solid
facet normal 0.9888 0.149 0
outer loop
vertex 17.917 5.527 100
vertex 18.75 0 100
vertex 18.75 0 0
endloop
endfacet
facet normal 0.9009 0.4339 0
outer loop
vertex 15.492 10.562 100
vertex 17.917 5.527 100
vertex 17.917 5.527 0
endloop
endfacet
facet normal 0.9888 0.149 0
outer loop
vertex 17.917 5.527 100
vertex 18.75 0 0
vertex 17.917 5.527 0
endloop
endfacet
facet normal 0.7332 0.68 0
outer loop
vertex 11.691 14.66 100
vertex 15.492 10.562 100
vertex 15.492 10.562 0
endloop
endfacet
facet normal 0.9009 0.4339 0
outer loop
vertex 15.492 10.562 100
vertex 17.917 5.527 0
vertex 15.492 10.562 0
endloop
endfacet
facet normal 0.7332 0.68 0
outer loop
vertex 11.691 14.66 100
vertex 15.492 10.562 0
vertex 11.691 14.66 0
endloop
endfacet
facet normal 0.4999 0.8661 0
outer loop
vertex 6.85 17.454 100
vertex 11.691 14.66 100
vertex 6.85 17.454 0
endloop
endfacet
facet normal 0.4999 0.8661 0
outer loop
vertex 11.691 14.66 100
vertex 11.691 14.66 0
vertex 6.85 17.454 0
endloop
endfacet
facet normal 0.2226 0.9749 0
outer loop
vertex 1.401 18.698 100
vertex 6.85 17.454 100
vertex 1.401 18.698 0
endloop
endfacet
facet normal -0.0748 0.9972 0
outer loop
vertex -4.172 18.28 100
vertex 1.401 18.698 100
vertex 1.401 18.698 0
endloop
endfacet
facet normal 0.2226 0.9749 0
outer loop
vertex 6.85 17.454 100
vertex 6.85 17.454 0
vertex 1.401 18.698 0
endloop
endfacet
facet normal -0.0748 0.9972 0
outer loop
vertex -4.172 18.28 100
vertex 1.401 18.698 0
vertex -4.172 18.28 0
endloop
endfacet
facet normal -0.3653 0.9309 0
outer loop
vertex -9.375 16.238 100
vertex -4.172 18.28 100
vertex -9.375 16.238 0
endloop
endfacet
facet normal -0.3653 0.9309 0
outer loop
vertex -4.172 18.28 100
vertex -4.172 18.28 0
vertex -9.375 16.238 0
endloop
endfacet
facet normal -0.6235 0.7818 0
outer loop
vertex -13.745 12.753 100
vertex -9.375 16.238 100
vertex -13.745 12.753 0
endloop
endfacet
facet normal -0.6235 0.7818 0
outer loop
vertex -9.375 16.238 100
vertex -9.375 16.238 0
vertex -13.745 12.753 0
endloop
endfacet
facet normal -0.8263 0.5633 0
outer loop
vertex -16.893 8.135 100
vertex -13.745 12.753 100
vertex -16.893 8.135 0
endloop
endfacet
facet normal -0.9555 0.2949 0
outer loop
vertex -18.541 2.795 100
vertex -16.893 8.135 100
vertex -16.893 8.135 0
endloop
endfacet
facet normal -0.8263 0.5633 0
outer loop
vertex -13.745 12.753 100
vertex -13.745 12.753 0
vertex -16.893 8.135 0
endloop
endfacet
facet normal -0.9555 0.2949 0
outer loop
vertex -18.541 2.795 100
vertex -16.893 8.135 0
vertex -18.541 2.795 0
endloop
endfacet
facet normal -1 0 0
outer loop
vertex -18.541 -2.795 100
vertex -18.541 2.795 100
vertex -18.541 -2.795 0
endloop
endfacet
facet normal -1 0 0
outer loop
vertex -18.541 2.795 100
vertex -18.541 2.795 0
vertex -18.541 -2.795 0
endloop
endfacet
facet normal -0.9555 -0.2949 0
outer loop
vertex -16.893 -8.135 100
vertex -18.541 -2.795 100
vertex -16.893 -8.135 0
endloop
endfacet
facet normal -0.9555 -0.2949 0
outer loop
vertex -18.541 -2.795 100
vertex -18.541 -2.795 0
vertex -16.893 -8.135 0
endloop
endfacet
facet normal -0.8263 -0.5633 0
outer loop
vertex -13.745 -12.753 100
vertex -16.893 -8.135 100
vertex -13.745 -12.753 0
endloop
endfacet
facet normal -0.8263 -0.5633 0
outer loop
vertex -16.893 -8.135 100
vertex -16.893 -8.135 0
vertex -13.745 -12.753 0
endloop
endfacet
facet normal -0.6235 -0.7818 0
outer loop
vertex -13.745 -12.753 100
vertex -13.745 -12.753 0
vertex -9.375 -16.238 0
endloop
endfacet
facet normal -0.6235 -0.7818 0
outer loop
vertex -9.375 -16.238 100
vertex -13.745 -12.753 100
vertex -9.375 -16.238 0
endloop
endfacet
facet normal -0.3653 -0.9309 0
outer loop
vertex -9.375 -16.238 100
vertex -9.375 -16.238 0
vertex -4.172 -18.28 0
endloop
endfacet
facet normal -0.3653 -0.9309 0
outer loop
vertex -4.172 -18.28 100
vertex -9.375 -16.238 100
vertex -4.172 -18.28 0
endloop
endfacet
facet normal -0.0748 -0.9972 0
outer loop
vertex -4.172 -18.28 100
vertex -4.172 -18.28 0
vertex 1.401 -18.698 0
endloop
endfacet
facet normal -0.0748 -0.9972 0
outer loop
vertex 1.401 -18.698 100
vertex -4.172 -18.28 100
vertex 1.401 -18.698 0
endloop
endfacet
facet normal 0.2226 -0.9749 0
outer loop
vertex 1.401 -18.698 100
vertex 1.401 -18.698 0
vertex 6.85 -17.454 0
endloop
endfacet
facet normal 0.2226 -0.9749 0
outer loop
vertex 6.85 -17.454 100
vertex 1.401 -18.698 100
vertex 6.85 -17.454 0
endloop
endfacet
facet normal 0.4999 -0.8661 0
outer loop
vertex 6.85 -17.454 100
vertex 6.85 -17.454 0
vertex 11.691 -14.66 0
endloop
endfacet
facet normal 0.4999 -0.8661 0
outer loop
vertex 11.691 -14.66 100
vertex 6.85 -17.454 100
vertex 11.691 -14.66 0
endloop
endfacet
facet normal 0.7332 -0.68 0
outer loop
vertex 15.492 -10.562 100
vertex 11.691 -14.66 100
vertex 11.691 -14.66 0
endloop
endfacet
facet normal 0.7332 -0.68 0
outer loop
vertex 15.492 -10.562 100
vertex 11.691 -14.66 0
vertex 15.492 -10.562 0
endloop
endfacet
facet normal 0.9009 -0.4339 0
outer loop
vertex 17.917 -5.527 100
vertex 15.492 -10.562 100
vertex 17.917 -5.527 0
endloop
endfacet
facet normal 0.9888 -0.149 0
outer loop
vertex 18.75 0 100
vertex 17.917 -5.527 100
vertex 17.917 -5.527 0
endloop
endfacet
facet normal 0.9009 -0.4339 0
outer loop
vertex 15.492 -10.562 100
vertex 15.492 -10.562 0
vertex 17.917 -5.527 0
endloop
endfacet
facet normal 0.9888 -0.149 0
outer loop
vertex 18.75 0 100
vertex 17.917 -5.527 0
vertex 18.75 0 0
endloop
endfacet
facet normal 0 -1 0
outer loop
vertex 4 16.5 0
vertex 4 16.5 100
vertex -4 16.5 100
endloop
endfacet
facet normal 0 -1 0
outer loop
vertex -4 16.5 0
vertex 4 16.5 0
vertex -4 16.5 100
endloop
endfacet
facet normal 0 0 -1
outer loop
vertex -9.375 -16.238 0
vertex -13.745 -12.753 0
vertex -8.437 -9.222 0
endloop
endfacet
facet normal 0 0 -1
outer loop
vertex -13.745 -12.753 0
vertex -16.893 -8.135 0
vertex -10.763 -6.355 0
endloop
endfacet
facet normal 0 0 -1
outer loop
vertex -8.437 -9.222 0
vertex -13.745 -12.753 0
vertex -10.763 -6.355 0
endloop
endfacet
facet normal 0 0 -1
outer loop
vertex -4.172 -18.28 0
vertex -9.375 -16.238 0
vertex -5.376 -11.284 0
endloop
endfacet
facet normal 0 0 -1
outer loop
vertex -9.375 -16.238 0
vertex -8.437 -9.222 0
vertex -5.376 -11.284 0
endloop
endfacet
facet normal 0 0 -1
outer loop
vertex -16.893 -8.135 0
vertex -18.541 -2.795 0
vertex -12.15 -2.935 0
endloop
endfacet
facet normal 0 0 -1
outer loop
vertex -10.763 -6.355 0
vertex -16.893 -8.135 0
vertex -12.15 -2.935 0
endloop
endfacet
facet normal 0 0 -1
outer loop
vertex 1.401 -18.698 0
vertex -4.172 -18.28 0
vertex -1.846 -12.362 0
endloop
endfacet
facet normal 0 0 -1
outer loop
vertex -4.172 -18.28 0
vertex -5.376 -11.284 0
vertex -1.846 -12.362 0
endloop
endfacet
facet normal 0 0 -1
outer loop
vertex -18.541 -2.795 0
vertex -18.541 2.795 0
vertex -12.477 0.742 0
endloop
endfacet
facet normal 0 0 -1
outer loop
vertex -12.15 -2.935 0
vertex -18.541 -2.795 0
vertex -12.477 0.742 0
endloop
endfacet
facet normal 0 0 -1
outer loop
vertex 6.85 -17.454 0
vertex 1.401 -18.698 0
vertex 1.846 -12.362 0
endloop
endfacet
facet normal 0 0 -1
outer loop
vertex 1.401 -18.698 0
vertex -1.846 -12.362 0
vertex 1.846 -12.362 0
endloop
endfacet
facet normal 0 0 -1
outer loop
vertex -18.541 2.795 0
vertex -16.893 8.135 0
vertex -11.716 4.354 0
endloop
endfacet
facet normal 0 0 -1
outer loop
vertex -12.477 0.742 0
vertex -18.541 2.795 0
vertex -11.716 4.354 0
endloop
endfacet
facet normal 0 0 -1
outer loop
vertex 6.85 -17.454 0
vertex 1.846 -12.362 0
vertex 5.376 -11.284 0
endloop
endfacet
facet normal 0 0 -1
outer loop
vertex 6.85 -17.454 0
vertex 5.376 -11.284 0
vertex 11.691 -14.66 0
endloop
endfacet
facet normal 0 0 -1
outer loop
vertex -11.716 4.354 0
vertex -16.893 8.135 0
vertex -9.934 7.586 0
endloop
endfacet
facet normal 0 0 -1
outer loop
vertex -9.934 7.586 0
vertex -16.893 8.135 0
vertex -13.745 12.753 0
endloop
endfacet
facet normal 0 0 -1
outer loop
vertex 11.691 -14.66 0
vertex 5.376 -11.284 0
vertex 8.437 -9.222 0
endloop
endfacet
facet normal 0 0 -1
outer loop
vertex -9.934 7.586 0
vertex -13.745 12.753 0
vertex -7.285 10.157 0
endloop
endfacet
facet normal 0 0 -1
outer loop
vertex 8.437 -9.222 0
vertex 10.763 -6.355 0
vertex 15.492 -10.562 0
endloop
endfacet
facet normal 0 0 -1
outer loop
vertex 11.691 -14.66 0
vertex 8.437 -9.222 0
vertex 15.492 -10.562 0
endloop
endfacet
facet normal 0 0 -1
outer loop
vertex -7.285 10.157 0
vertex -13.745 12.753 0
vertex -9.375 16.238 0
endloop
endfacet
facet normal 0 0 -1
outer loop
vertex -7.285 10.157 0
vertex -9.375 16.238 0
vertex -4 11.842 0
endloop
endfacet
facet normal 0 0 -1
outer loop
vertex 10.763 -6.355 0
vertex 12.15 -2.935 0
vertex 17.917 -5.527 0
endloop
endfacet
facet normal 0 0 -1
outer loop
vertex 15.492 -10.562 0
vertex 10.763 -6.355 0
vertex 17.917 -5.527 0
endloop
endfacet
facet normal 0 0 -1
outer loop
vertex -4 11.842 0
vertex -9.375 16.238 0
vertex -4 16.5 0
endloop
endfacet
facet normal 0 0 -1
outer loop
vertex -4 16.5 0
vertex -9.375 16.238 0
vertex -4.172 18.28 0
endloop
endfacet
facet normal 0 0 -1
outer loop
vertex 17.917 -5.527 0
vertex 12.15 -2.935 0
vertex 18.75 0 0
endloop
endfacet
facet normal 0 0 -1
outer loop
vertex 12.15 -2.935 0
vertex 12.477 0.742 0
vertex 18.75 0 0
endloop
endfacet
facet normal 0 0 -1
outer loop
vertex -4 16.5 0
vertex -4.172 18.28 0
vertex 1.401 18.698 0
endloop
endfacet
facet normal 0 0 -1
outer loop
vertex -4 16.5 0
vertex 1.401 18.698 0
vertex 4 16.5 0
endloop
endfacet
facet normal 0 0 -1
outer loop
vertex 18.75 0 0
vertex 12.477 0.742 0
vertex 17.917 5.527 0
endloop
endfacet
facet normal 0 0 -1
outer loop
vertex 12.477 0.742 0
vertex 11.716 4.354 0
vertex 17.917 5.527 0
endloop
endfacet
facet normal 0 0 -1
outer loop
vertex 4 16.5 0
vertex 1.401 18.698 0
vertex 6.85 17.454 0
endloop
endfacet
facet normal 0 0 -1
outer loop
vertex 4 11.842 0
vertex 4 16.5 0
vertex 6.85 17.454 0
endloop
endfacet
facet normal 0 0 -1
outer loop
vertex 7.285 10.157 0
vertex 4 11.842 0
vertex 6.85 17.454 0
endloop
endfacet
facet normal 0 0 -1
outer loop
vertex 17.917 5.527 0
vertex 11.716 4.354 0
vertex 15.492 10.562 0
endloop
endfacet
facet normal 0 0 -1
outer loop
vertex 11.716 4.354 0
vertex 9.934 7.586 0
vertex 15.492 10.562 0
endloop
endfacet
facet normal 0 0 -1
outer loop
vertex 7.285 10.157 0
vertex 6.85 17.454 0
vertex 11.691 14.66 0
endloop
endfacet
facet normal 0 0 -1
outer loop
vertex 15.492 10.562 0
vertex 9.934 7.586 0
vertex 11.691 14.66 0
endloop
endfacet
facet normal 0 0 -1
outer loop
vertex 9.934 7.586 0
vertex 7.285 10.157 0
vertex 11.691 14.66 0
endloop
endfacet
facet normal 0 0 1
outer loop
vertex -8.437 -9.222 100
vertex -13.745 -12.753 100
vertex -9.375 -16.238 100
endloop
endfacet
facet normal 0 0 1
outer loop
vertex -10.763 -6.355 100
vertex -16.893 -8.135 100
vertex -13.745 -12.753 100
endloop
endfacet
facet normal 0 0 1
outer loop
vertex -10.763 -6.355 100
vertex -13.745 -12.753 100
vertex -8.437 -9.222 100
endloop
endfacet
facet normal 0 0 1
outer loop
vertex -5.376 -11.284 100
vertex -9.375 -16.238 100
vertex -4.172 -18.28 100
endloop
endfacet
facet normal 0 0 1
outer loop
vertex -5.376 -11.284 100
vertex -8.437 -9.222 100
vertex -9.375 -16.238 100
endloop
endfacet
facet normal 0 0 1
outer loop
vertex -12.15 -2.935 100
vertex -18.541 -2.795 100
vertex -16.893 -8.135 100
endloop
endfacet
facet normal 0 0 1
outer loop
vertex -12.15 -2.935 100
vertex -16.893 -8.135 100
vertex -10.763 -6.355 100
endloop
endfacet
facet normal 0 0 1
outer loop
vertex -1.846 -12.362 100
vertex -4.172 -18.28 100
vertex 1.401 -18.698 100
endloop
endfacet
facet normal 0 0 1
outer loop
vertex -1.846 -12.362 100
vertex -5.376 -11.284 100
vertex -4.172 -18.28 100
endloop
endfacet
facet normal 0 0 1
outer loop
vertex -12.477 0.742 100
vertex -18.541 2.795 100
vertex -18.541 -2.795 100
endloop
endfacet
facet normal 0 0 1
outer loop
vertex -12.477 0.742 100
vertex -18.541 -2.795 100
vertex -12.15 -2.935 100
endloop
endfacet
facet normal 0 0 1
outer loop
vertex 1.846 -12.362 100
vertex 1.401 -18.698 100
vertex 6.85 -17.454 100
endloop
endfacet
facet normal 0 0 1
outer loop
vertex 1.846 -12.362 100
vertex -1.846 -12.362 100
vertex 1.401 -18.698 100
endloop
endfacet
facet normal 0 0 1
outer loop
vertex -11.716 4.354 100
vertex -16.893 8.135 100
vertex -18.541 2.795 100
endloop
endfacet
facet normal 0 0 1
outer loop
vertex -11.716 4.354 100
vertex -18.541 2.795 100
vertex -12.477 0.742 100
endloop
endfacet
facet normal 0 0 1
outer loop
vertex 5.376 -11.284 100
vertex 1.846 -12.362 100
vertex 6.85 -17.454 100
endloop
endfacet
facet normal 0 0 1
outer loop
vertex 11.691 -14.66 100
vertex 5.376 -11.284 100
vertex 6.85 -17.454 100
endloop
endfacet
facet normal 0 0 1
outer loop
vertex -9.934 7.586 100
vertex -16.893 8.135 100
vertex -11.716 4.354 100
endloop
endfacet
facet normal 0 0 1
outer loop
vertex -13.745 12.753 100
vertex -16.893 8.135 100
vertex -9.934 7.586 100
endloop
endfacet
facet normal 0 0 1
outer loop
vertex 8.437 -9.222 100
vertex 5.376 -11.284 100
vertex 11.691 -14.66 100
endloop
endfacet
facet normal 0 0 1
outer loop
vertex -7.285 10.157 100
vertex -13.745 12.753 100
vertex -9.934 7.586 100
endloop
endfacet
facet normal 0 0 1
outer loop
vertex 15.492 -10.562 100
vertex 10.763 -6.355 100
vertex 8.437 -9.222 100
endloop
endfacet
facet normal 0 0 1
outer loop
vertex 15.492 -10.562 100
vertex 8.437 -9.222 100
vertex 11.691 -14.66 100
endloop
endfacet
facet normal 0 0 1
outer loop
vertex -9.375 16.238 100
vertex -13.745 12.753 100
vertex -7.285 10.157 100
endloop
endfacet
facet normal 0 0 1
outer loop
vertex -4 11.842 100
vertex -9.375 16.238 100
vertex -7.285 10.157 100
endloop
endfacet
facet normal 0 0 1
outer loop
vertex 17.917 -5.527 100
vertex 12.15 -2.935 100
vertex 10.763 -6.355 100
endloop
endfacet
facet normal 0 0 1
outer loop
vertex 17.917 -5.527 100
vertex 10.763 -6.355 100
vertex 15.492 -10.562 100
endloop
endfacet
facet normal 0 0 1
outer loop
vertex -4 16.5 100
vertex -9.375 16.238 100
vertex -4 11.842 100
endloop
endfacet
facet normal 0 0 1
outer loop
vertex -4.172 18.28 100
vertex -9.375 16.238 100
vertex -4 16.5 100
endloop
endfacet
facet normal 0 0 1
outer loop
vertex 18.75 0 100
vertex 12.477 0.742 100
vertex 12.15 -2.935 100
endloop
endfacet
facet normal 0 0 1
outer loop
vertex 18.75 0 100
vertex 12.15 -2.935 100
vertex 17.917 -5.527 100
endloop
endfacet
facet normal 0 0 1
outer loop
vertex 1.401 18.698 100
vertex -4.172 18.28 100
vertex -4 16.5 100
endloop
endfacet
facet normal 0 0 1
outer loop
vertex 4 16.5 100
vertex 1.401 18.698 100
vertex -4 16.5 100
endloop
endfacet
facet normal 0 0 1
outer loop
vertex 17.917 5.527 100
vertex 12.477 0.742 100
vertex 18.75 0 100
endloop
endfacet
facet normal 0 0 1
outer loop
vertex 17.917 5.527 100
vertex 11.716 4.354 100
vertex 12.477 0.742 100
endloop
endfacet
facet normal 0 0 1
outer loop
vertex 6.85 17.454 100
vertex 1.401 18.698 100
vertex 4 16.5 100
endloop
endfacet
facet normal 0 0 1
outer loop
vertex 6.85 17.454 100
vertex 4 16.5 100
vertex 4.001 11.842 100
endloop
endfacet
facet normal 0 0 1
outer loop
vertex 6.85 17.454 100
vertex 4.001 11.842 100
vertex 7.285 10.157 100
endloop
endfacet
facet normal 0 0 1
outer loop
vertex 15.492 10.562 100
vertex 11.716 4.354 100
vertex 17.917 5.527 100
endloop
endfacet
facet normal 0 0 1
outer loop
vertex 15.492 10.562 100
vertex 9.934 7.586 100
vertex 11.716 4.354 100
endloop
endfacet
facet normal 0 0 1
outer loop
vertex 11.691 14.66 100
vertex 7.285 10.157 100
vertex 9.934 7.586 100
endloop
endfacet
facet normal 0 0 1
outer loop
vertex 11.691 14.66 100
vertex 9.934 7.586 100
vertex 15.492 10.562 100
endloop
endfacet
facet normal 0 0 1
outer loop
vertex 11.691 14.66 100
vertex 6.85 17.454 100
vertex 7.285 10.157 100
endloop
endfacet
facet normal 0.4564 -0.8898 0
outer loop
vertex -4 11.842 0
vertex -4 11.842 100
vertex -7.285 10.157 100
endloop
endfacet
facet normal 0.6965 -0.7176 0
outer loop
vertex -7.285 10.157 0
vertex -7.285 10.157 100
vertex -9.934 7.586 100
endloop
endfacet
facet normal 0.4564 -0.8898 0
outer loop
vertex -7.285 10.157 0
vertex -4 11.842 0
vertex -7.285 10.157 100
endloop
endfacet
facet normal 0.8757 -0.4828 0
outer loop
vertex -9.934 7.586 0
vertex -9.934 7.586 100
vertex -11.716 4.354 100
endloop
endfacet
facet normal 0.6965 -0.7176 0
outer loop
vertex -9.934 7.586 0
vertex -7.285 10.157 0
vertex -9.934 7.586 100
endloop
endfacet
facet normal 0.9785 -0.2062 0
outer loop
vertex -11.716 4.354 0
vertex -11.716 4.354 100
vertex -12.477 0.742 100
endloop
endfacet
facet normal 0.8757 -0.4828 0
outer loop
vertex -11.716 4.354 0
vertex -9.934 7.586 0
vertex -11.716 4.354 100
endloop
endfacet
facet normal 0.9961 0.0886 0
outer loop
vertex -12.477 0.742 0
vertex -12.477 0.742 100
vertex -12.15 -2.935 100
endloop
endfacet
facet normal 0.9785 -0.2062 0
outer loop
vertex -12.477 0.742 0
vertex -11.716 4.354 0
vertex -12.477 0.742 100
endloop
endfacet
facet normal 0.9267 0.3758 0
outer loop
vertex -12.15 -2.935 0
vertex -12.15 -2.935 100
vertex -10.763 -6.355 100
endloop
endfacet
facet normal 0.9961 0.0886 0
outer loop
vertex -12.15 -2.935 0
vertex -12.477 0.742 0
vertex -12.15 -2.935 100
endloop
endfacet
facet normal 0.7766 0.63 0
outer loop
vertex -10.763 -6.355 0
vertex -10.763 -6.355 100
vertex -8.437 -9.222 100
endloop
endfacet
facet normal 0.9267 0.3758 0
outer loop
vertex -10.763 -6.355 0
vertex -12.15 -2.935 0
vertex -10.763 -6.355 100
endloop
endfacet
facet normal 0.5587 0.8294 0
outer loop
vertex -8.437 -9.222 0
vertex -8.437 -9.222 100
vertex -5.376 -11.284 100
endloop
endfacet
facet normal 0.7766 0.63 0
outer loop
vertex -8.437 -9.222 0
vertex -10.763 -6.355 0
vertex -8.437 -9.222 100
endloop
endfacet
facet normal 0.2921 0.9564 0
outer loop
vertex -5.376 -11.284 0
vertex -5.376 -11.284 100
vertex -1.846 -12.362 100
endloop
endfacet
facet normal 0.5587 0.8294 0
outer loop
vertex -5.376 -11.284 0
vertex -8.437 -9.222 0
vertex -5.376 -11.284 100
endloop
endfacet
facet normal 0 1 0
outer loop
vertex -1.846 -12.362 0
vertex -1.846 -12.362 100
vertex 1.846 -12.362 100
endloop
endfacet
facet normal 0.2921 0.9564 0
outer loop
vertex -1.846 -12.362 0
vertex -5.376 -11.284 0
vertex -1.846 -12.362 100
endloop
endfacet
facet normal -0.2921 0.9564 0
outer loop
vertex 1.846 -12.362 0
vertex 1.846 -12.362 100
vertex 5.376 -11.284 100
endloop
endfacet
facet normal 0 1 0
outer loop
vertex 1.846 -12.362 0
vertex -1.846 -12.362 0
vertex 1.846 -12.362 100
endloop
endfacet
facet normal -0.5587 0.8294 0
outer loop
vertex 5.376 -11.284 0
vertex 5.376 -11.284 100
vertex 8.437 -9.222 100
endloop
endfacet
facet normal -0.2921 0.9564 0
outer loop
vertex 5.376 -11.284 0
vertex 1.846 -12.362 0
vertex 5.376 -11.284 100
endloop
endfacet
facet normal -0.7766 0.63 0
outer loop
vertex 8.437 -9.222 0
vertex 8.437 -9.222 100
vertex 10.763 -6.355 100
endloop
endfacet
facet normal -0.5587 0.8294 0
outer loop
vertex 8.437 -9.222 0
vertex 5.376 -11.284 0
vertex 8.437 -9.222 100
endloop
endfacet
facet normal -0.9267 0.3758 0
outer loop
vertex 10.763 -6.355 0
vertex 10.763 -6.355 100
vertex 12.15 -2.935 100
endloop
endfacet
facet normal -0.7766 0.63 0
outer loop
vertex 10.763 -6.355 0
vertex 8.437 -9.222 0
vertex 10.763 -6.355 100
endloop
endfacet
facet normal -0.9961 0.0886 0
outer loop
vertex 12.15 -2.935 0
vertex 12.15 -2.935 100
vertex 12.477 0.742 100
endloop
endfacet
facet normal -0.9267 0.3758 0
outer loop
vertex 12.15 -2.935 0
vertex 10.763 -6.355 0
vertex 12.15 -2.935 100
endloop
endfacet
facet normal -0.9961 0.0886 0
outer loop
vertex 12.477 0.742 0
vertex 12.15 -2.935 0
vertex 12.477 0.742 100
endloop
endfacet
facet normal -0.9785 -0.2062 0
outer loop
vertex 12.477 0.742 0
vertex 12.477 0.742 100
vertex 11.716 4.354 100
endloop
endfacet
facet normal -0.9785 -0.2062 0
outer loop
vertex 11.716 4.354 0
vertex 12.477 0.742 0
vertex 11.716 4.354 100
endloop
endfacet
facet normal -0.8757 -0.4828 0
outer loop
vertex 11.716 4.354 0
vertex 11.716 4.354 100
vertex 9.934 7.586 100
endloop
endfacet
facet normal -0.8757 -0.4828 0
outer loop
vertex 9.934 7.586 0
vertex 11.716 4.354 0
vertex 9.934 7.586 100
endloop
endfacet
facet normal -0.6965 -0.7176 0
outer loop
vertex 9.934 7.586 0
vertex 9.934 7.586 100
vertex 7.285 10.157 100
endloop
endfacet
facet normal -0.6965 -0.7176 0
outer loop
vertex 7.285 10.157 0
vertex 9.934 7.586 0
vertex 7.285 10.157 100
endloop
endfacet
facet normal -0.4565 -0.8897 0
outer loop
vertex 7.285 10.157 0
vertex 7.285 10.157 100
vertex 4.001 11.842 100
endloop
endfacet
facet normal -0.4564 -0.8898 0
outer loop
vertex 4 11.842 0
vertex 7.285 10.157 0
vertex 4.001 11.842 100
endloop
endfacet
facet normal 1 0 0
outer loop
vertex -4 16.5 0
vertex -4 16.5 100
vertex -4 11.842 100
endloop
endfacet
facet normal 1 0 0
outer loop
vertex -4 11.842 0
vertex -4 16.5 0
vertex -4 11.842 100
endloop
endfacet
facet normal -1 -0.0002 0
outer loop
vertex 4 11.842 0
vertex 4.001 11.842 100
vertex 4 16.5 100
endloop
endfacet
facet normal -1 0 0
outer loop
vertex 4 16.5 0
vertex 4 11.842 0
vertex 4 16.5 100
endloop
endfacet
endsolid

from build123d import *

# Parameters (mm, degrees)
F0_R     = 18.75028
F0_R_2   = 12.49934
F1_DEPTH = 99.9998
F3_DEPTH = 100.0008


with BuildPart() as f1:
    # F0 (on Top) → F1 (new body)
    with BuildSketch(Plane.XY):
        Circle(F0_R)
        Circle(F0_R_2, mode=Mode.SUBTRACT)
    extrude(amount=F1_DEPTH)

    # F2 (on face) → F3 (cut, through all)
    with BuildSketch(Plane.XY.offset(99.9998)):
        with BuildLine():
            ThreePointArc((-4.0005, 11.841854), (-7.288, -10.154731), (12.49934, 0))
            ThreePointArc((12.49934, 0), (10.154731, 7.288), (4.0005, 11.841854))
            Line((4.0005, 11.841854), (4.0005, 8.49884))
            Line((4.0005, 8.49884), (-4.0005, 8.49884))
            Line((-4.0005, 8.49884), (-4.0005, 11.841854))
        make_face()
        with BuildLine():
            ThreePointArc((-4.0005, 11.841854), (0, 12.49934), (4.0005, 11.841854))
            Line((4.0005, 11.841854), (4.0005, 16.49984))
            Line((4.0005, 16.49984), (-4.0005, 16.49984))
            Line((-4.0005, 16.49984), (-4.0005, 11.841854))
        make_face()
    extrude(amount=-F3_DEPTH, mode=Mode.SUBTRACT)


solid = f1.part
